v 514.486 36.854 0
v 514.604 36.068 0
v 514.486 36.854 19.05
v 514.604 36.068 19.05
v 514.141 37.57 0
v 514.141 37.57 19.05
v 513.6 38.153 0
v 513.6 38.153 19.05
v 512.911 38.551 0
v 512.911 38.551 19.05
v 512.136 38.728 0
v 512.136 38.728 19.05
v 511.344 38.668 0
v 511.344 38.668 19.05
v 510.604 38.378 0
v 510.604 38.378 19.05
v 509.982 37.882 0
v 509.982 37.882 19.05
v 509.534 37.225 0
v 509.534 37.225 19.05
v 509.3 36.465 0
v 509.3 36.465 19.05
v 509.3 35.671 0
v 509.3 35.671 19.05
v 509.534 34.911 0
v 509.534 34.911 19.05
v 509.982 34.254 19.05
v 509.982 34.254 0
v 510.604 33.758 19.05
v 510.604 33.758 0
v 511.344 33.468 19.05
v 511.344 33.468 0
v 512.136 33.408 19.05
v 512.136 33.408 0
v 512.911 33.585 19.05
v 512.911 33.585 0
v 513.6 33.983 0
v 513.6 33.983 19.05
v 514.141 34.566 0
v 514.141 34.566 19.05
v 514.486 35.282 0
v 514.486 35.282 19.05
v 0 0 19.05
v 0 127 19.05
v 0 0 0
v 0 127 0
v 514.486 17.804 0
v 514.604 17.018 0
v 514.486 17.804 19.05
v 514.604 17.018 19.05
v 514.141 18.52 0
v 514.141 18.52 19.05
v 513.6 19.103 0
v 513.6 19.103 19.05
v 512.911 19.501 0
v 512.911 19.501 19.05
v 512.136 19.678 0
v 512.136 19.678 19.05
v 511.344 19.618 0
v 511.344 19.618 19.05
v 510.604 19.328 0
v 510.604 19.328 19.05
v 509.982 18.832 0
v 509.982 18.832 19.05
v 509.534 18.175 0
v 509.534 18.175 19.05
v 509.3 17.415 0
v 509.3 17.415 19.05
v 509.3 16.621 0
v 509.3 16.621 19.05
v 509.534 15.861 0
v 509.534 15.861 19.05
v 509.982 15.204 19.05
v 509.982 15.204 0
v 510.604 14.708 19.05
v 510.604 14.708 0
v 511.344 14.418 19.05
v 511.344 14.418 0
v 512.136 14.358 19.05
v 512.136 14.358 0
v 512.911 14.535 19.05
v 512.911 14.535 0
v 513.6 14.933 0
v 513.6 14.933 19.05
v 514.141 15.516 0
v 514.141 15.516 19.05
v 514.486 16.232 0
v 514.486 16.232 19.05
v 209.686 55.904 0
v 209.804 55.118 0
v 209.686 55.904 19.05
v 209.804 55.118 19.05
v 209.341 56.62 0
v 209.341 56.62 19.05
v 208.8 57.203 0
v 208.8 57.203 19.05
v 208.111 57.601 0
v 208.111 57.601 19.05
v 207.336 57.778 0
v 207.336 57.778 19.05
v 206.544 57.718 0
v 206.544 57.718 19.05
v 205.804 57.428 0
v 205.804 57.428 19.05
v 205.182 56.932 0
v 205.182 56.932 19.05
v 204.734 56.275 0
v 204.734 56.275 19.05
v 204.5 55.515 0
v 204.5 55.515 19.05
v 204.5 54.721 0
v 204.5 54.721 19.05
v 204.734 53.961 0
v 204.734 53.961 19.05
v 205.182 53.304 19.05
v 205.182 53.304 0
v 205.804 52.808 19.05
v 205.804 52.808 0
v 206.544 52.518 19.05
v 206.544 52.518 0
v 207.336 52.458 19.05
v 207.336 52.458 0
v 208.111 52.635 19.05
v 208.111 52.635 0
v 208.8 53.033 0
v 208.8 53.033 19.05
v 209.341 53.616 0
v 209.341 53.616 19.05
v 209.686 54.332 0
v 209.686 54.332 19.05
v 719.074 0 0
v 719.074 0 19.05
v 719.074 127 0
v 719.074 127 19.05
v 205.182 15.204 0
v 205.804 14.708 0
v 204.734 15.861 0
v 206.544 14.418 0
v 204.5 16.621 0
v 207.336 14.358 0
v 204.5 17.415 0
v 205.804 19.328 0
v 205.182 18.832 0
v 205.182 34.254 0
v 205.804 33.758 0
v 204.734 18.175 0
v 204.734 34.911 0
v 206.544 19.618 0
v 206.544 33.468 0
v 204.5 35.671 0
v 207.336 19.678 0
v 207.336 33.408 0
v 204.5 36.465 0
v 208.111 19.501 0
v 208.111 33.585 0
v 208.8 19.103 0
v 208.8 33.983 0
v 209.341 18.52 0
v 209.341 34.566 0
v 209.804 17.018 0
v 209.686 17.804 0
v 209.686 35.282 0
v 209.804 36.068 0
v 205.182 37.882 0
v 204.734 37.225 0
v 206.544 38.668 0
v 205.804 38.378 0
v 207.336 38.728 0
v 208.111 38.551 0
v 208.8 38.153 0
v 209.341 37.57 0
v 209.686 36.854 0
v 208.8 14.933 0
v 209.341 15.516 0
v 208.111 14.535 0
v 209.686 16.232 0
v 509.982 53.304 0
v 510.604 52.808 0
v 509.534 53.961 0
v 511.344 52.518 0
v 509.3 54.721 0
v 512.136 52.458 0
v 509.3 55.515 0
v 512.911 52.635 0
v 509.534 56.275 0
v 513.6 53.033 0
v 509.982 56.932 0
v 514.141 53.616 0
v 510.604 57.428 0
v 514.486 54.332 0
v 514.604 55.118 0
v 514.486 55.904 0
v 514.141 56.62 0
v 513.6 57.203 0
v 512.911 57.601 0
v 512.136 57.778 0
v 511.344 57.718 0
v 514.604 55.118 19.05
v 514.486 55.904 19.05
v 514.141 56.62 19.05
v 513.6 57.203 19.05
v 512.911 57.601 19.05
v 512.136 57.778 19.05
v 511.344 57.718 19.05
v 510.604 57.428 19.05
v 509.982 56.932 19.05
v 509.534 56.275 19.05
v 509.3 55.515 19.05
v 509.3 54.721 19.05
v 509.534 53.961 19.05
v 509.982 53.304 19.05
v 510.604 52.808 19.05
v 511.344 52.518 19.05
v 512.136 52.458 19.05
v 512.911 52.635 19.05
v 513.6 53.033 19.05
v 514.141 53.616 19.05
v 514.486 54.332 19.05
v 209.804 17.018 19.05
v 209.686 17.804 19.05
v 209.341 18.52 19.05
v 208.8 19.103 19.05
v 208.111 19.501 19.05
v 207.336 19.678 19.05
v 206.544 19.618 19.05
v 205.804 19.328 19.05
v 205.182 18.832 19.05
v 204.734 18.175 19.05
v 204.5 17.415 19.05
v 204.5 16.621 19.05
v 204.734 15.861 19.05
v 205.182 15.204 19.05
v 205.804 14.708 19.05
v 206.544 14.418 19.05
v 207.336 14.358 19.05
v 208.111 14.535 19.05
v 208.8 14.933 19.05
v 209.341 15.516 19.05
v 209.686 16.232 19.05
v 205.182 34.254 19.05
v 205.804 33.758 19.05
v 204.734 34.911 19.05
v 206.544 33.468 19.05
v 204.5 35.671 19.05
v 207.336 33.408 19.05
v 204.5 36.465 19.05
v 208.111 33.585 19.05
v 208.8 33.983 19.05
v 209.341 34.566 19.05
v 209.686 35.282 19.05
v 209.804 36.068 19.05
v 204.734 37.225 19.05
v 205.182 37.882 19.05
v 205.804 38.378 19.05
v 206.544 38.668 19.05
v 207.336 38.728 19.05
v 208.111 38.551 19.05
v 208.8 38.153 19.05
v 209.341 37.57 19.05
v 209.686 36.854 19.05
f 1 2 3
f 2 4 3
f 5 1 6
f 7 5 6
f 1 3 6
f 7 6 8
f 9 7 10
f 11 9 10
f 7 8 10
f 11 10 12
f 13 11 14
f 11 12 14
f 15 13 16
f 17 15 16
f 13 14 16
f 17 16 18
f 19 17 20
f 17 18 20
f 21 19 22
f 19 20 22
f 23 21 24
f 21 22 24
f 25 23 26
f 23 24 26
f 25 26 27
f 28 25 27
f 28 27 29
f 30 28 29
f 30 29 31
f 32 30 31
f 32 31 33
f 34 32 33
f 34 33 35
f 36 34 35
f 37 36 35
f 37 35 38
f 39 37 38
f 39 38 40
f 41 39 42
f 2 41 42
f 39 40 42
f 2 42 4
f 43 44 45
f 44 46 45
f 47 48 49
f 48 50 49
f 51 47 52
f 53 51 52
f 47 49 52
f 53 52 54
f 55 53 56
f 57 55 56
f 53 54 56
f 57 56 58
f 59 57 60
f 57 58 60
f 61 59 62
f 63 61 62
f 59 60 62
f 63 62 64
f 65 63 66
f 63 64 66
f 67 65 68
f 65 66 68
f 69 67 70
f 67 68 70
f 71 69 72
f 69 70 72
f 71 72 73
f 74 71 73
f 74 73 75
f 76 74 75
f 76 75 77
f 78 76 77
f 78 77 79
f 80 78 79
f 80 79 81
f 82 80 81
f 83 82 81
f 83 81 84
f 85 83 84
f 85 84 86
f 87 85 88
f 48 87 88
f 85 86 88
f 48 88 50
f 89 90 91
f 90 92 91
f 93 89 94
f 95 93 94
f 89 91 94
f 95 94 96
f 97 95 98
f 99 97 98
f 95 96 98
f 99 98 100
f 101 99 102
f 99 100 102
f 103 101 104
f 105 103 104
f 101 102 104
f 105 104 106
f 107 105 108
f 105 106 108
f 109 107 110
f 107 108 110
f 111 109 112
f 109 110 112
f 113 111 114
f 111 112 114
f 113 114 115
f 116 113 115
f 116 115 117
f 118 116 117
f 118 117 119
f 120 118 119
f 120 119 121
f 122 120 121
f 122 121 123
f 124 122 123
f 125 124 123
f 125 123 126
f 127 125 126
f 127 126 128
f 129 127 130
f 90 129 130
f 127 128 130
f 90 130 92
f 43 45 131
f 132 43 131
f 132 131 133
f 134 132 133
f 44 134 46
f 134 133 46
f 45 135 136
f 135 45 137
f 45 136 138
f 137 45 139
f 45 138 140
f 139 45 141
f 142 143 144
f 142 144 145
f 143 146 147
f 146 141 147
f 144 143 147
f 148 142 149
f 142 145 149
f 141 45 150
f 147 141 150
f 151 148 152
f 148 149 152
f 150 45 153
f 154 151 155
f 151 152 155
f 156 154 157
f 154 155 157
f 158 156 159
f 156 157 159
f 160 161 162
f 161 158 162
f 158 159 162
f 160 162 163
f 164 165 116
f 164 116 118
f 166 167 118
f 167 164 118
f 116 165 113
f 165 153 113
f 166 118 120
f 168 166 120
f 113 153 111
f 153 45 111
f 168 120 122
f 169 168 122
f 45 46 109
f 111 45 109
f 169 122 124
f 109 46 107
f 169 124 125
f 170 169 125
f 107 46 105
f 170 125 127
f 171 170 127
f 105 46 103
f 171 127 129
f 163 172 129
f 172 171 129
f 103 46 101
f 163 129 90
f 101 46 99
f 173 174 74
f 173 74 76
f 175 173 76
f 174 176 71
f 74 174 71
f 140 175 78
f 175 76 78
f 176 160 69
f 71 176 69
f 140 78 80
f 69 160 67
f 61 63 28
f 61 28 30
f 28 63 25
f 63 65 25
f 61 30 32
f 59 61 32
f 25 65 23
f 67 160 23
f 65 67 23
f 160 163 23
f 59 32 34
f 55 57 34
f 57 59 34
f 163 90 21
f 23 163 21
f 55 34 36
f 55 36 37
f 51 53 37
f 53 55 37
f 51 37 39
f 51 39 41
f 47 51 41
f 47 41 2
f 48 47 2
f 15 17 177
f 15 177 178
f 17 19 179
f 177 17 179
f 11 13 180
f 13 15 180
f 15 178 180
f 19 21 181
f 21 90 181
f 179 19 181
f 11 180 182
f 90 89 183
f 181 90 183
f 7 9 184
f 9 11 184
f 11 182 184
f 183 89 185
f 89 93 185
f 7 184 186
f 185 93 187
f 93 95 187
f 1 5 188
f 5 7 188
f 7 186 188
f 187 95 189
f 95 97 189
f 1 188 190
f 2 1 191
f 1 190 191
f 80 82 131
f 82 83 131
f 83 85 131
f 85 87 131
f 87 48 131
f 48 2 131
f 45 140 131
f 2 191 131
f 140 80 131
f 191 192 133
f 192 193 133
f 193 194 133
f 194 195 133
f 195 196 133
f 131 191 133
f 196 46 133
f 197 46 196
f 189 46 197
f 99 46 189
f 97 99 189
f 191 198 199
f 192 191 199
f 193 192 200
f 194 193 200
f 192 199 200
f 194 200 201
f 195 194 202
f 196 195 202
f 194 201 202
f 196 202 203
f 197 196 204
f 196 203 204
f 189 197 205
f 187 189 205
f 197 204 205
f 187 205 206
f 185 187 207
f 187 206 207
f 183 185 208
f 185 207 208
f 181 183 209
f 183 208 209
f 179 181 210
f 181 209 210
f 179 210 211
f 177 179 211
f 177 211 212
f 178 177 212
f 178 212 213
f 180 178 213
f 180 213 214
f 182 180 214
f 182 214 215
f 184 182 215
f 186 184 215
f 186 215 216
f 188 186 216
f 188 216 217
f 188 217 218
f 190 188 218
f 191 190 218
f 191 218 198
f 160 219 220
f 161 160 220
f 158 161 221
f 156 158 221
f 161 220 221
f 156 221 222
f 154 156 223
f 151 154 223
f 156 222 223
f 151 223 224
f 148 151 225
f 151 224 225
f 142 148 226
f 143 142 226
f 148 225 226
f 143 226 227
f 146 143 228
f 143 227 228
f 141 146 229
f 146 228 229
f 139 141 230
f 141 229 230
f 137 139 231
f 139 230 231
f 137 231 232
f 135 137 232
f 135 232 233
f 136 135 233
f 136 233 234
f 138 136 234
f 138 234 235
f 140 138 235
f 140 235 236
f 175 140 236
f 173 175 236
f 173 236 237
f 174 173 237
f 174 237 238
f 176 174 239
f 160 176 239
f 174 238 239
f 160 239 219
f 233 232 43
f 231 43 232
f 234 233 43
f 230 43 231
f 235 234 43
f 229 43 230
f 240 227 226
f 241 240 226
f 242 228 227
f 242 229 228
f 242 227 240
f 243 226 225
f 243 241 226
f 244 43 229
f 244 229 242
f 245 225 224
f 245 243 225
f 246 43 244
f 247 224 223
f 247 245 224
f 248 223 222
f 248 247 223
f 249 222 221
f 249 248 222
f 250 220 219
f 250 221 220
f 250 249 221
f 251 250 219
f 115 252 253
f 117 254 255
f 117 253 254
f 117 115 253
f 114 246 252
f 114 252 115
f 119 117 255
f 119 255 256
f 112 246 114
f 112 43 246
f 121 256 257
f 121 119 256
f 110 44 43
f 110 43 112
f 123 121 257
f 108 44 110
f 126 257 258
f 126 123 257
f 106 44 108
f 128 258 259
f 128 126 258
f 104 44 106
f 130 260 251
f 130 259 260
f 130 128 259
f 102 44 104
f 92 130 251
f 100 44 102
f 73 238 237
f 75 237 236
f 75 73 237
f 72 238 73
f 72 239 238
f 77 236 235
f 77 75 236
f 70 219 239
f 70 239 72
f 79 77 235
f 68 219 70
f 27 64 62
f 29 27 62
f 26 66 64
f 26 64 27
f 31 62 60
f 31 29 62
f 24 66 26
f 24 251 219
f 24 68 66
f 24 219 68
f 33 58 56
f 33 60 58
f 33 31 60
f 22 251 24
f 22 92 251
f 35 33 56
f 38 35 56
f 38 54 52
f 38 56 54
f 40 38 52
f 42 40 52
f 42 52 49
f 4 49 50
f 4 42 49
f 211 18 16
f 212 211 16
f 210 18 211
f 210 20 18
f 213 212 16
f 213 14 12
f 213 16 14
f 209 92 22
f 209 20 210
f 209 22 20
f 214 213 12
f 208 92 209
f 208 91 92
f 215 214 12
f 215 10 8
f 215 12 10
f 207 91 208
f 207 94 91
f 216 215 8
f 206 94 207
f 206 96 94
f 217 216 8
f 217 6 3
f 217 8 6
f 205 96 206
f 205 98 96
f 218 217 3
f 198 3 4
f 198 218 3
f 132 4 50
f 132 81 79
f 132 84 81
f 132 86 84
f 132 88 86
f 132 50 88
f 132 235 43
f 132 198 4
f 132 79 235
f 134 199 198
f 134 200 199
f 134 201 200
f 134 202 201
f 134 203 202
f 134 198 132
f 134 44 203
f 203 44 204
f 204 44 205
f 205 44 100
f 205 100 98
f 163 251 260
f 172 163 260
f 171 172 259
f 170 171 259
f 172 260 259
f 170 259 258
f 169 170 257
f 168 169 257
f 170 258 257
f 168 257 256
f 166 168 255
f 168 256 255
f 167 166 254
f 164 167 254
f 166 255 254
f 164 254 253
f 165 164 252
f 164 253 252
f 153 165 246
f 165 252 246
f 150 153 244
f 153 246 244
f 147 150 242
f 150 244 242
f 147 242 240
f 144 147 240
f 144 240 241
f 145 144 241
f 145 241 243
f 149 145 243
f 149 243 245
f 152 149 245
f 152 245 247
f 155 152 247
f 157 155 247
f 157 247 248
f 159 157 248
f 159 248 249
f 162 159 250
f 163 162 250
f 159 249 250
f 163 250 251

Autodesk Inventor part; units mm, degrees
ref_plane "YZ Plane" through (0, 0, 0) normal (1, 0, 0) x (0, 1, 0)
ref_plane "XZ Plane" through (0, 0, 0) normal (0, 1, 0) x (-1, 0, 0)
ref_plane "XY Plane" through (0, 0, 0) normal (0, 0, 1) x (1, 0, 0)
sketch "Sketch1" plane through (0, 0, 0) normal (0, 0, 1) x (1, 0, 0)
  line L0 (0, 0) -> (719.074, 0)
  line L1 (719.074, 0) -> (719.074, 127)
  line L2 (719.074, 127) -> (0, 127)
  line L3 (0, 127) -> (0, 0)
  dimension "d0" = 719.074
  dimension "d1" = 127
extrude "Extrusion1" add sketch "Sketch1" along normal blind 19.05
sketch "Sketch2" plane through (0, 0, 19.05) normal (0, 0, 1) x (1, 0, 0)
  line L0 (0, 0) -> (719.074, 0) construction
  line L1 (0, 0) -> (207.137, 0) construction
  line L2 (207.137, 0) -> (207.137, 17.018) construction
  line L3 (207.137, 17.018) -> (207.137, 36.068) construction
  line L4 (207.137, 36.068) -> (207.137, 55.118) construction
  line L5 (719.074, 127) -> (0, 127) construction
  line L6 (359.537, 127) -> (359.537, 0) construction
  circle A0 centre (207.137, 17.018) radius 2.667
  circle A1 centre (207.137, 36.068) radius 2.667
  circle A2 centre (207.137, 55.118) radius 2.667
  line L7 (511.937, 17.018) -> (511.937, 36.068) construction
  line L8 (511.937, 36.068) -> (511.937, 55.118) construction
  circle A3 centre (511.937, 17.018) radius 2.667
  circle A4 centre (511.937, 36.068) radius 2.667
  circle A5 centre (511.937, 55.118) radius 2.667
  dimension "d4" = 207.137
  dimension "d5" = 17.018
  dimension "d6" = 19.05
  dimension "d7" = 19.05
  dimension "d8" = 5.334
extrude "Extrusion2" cut sketch "Sketch2" against normal blind 19.05
properties part number "Long Plank"
